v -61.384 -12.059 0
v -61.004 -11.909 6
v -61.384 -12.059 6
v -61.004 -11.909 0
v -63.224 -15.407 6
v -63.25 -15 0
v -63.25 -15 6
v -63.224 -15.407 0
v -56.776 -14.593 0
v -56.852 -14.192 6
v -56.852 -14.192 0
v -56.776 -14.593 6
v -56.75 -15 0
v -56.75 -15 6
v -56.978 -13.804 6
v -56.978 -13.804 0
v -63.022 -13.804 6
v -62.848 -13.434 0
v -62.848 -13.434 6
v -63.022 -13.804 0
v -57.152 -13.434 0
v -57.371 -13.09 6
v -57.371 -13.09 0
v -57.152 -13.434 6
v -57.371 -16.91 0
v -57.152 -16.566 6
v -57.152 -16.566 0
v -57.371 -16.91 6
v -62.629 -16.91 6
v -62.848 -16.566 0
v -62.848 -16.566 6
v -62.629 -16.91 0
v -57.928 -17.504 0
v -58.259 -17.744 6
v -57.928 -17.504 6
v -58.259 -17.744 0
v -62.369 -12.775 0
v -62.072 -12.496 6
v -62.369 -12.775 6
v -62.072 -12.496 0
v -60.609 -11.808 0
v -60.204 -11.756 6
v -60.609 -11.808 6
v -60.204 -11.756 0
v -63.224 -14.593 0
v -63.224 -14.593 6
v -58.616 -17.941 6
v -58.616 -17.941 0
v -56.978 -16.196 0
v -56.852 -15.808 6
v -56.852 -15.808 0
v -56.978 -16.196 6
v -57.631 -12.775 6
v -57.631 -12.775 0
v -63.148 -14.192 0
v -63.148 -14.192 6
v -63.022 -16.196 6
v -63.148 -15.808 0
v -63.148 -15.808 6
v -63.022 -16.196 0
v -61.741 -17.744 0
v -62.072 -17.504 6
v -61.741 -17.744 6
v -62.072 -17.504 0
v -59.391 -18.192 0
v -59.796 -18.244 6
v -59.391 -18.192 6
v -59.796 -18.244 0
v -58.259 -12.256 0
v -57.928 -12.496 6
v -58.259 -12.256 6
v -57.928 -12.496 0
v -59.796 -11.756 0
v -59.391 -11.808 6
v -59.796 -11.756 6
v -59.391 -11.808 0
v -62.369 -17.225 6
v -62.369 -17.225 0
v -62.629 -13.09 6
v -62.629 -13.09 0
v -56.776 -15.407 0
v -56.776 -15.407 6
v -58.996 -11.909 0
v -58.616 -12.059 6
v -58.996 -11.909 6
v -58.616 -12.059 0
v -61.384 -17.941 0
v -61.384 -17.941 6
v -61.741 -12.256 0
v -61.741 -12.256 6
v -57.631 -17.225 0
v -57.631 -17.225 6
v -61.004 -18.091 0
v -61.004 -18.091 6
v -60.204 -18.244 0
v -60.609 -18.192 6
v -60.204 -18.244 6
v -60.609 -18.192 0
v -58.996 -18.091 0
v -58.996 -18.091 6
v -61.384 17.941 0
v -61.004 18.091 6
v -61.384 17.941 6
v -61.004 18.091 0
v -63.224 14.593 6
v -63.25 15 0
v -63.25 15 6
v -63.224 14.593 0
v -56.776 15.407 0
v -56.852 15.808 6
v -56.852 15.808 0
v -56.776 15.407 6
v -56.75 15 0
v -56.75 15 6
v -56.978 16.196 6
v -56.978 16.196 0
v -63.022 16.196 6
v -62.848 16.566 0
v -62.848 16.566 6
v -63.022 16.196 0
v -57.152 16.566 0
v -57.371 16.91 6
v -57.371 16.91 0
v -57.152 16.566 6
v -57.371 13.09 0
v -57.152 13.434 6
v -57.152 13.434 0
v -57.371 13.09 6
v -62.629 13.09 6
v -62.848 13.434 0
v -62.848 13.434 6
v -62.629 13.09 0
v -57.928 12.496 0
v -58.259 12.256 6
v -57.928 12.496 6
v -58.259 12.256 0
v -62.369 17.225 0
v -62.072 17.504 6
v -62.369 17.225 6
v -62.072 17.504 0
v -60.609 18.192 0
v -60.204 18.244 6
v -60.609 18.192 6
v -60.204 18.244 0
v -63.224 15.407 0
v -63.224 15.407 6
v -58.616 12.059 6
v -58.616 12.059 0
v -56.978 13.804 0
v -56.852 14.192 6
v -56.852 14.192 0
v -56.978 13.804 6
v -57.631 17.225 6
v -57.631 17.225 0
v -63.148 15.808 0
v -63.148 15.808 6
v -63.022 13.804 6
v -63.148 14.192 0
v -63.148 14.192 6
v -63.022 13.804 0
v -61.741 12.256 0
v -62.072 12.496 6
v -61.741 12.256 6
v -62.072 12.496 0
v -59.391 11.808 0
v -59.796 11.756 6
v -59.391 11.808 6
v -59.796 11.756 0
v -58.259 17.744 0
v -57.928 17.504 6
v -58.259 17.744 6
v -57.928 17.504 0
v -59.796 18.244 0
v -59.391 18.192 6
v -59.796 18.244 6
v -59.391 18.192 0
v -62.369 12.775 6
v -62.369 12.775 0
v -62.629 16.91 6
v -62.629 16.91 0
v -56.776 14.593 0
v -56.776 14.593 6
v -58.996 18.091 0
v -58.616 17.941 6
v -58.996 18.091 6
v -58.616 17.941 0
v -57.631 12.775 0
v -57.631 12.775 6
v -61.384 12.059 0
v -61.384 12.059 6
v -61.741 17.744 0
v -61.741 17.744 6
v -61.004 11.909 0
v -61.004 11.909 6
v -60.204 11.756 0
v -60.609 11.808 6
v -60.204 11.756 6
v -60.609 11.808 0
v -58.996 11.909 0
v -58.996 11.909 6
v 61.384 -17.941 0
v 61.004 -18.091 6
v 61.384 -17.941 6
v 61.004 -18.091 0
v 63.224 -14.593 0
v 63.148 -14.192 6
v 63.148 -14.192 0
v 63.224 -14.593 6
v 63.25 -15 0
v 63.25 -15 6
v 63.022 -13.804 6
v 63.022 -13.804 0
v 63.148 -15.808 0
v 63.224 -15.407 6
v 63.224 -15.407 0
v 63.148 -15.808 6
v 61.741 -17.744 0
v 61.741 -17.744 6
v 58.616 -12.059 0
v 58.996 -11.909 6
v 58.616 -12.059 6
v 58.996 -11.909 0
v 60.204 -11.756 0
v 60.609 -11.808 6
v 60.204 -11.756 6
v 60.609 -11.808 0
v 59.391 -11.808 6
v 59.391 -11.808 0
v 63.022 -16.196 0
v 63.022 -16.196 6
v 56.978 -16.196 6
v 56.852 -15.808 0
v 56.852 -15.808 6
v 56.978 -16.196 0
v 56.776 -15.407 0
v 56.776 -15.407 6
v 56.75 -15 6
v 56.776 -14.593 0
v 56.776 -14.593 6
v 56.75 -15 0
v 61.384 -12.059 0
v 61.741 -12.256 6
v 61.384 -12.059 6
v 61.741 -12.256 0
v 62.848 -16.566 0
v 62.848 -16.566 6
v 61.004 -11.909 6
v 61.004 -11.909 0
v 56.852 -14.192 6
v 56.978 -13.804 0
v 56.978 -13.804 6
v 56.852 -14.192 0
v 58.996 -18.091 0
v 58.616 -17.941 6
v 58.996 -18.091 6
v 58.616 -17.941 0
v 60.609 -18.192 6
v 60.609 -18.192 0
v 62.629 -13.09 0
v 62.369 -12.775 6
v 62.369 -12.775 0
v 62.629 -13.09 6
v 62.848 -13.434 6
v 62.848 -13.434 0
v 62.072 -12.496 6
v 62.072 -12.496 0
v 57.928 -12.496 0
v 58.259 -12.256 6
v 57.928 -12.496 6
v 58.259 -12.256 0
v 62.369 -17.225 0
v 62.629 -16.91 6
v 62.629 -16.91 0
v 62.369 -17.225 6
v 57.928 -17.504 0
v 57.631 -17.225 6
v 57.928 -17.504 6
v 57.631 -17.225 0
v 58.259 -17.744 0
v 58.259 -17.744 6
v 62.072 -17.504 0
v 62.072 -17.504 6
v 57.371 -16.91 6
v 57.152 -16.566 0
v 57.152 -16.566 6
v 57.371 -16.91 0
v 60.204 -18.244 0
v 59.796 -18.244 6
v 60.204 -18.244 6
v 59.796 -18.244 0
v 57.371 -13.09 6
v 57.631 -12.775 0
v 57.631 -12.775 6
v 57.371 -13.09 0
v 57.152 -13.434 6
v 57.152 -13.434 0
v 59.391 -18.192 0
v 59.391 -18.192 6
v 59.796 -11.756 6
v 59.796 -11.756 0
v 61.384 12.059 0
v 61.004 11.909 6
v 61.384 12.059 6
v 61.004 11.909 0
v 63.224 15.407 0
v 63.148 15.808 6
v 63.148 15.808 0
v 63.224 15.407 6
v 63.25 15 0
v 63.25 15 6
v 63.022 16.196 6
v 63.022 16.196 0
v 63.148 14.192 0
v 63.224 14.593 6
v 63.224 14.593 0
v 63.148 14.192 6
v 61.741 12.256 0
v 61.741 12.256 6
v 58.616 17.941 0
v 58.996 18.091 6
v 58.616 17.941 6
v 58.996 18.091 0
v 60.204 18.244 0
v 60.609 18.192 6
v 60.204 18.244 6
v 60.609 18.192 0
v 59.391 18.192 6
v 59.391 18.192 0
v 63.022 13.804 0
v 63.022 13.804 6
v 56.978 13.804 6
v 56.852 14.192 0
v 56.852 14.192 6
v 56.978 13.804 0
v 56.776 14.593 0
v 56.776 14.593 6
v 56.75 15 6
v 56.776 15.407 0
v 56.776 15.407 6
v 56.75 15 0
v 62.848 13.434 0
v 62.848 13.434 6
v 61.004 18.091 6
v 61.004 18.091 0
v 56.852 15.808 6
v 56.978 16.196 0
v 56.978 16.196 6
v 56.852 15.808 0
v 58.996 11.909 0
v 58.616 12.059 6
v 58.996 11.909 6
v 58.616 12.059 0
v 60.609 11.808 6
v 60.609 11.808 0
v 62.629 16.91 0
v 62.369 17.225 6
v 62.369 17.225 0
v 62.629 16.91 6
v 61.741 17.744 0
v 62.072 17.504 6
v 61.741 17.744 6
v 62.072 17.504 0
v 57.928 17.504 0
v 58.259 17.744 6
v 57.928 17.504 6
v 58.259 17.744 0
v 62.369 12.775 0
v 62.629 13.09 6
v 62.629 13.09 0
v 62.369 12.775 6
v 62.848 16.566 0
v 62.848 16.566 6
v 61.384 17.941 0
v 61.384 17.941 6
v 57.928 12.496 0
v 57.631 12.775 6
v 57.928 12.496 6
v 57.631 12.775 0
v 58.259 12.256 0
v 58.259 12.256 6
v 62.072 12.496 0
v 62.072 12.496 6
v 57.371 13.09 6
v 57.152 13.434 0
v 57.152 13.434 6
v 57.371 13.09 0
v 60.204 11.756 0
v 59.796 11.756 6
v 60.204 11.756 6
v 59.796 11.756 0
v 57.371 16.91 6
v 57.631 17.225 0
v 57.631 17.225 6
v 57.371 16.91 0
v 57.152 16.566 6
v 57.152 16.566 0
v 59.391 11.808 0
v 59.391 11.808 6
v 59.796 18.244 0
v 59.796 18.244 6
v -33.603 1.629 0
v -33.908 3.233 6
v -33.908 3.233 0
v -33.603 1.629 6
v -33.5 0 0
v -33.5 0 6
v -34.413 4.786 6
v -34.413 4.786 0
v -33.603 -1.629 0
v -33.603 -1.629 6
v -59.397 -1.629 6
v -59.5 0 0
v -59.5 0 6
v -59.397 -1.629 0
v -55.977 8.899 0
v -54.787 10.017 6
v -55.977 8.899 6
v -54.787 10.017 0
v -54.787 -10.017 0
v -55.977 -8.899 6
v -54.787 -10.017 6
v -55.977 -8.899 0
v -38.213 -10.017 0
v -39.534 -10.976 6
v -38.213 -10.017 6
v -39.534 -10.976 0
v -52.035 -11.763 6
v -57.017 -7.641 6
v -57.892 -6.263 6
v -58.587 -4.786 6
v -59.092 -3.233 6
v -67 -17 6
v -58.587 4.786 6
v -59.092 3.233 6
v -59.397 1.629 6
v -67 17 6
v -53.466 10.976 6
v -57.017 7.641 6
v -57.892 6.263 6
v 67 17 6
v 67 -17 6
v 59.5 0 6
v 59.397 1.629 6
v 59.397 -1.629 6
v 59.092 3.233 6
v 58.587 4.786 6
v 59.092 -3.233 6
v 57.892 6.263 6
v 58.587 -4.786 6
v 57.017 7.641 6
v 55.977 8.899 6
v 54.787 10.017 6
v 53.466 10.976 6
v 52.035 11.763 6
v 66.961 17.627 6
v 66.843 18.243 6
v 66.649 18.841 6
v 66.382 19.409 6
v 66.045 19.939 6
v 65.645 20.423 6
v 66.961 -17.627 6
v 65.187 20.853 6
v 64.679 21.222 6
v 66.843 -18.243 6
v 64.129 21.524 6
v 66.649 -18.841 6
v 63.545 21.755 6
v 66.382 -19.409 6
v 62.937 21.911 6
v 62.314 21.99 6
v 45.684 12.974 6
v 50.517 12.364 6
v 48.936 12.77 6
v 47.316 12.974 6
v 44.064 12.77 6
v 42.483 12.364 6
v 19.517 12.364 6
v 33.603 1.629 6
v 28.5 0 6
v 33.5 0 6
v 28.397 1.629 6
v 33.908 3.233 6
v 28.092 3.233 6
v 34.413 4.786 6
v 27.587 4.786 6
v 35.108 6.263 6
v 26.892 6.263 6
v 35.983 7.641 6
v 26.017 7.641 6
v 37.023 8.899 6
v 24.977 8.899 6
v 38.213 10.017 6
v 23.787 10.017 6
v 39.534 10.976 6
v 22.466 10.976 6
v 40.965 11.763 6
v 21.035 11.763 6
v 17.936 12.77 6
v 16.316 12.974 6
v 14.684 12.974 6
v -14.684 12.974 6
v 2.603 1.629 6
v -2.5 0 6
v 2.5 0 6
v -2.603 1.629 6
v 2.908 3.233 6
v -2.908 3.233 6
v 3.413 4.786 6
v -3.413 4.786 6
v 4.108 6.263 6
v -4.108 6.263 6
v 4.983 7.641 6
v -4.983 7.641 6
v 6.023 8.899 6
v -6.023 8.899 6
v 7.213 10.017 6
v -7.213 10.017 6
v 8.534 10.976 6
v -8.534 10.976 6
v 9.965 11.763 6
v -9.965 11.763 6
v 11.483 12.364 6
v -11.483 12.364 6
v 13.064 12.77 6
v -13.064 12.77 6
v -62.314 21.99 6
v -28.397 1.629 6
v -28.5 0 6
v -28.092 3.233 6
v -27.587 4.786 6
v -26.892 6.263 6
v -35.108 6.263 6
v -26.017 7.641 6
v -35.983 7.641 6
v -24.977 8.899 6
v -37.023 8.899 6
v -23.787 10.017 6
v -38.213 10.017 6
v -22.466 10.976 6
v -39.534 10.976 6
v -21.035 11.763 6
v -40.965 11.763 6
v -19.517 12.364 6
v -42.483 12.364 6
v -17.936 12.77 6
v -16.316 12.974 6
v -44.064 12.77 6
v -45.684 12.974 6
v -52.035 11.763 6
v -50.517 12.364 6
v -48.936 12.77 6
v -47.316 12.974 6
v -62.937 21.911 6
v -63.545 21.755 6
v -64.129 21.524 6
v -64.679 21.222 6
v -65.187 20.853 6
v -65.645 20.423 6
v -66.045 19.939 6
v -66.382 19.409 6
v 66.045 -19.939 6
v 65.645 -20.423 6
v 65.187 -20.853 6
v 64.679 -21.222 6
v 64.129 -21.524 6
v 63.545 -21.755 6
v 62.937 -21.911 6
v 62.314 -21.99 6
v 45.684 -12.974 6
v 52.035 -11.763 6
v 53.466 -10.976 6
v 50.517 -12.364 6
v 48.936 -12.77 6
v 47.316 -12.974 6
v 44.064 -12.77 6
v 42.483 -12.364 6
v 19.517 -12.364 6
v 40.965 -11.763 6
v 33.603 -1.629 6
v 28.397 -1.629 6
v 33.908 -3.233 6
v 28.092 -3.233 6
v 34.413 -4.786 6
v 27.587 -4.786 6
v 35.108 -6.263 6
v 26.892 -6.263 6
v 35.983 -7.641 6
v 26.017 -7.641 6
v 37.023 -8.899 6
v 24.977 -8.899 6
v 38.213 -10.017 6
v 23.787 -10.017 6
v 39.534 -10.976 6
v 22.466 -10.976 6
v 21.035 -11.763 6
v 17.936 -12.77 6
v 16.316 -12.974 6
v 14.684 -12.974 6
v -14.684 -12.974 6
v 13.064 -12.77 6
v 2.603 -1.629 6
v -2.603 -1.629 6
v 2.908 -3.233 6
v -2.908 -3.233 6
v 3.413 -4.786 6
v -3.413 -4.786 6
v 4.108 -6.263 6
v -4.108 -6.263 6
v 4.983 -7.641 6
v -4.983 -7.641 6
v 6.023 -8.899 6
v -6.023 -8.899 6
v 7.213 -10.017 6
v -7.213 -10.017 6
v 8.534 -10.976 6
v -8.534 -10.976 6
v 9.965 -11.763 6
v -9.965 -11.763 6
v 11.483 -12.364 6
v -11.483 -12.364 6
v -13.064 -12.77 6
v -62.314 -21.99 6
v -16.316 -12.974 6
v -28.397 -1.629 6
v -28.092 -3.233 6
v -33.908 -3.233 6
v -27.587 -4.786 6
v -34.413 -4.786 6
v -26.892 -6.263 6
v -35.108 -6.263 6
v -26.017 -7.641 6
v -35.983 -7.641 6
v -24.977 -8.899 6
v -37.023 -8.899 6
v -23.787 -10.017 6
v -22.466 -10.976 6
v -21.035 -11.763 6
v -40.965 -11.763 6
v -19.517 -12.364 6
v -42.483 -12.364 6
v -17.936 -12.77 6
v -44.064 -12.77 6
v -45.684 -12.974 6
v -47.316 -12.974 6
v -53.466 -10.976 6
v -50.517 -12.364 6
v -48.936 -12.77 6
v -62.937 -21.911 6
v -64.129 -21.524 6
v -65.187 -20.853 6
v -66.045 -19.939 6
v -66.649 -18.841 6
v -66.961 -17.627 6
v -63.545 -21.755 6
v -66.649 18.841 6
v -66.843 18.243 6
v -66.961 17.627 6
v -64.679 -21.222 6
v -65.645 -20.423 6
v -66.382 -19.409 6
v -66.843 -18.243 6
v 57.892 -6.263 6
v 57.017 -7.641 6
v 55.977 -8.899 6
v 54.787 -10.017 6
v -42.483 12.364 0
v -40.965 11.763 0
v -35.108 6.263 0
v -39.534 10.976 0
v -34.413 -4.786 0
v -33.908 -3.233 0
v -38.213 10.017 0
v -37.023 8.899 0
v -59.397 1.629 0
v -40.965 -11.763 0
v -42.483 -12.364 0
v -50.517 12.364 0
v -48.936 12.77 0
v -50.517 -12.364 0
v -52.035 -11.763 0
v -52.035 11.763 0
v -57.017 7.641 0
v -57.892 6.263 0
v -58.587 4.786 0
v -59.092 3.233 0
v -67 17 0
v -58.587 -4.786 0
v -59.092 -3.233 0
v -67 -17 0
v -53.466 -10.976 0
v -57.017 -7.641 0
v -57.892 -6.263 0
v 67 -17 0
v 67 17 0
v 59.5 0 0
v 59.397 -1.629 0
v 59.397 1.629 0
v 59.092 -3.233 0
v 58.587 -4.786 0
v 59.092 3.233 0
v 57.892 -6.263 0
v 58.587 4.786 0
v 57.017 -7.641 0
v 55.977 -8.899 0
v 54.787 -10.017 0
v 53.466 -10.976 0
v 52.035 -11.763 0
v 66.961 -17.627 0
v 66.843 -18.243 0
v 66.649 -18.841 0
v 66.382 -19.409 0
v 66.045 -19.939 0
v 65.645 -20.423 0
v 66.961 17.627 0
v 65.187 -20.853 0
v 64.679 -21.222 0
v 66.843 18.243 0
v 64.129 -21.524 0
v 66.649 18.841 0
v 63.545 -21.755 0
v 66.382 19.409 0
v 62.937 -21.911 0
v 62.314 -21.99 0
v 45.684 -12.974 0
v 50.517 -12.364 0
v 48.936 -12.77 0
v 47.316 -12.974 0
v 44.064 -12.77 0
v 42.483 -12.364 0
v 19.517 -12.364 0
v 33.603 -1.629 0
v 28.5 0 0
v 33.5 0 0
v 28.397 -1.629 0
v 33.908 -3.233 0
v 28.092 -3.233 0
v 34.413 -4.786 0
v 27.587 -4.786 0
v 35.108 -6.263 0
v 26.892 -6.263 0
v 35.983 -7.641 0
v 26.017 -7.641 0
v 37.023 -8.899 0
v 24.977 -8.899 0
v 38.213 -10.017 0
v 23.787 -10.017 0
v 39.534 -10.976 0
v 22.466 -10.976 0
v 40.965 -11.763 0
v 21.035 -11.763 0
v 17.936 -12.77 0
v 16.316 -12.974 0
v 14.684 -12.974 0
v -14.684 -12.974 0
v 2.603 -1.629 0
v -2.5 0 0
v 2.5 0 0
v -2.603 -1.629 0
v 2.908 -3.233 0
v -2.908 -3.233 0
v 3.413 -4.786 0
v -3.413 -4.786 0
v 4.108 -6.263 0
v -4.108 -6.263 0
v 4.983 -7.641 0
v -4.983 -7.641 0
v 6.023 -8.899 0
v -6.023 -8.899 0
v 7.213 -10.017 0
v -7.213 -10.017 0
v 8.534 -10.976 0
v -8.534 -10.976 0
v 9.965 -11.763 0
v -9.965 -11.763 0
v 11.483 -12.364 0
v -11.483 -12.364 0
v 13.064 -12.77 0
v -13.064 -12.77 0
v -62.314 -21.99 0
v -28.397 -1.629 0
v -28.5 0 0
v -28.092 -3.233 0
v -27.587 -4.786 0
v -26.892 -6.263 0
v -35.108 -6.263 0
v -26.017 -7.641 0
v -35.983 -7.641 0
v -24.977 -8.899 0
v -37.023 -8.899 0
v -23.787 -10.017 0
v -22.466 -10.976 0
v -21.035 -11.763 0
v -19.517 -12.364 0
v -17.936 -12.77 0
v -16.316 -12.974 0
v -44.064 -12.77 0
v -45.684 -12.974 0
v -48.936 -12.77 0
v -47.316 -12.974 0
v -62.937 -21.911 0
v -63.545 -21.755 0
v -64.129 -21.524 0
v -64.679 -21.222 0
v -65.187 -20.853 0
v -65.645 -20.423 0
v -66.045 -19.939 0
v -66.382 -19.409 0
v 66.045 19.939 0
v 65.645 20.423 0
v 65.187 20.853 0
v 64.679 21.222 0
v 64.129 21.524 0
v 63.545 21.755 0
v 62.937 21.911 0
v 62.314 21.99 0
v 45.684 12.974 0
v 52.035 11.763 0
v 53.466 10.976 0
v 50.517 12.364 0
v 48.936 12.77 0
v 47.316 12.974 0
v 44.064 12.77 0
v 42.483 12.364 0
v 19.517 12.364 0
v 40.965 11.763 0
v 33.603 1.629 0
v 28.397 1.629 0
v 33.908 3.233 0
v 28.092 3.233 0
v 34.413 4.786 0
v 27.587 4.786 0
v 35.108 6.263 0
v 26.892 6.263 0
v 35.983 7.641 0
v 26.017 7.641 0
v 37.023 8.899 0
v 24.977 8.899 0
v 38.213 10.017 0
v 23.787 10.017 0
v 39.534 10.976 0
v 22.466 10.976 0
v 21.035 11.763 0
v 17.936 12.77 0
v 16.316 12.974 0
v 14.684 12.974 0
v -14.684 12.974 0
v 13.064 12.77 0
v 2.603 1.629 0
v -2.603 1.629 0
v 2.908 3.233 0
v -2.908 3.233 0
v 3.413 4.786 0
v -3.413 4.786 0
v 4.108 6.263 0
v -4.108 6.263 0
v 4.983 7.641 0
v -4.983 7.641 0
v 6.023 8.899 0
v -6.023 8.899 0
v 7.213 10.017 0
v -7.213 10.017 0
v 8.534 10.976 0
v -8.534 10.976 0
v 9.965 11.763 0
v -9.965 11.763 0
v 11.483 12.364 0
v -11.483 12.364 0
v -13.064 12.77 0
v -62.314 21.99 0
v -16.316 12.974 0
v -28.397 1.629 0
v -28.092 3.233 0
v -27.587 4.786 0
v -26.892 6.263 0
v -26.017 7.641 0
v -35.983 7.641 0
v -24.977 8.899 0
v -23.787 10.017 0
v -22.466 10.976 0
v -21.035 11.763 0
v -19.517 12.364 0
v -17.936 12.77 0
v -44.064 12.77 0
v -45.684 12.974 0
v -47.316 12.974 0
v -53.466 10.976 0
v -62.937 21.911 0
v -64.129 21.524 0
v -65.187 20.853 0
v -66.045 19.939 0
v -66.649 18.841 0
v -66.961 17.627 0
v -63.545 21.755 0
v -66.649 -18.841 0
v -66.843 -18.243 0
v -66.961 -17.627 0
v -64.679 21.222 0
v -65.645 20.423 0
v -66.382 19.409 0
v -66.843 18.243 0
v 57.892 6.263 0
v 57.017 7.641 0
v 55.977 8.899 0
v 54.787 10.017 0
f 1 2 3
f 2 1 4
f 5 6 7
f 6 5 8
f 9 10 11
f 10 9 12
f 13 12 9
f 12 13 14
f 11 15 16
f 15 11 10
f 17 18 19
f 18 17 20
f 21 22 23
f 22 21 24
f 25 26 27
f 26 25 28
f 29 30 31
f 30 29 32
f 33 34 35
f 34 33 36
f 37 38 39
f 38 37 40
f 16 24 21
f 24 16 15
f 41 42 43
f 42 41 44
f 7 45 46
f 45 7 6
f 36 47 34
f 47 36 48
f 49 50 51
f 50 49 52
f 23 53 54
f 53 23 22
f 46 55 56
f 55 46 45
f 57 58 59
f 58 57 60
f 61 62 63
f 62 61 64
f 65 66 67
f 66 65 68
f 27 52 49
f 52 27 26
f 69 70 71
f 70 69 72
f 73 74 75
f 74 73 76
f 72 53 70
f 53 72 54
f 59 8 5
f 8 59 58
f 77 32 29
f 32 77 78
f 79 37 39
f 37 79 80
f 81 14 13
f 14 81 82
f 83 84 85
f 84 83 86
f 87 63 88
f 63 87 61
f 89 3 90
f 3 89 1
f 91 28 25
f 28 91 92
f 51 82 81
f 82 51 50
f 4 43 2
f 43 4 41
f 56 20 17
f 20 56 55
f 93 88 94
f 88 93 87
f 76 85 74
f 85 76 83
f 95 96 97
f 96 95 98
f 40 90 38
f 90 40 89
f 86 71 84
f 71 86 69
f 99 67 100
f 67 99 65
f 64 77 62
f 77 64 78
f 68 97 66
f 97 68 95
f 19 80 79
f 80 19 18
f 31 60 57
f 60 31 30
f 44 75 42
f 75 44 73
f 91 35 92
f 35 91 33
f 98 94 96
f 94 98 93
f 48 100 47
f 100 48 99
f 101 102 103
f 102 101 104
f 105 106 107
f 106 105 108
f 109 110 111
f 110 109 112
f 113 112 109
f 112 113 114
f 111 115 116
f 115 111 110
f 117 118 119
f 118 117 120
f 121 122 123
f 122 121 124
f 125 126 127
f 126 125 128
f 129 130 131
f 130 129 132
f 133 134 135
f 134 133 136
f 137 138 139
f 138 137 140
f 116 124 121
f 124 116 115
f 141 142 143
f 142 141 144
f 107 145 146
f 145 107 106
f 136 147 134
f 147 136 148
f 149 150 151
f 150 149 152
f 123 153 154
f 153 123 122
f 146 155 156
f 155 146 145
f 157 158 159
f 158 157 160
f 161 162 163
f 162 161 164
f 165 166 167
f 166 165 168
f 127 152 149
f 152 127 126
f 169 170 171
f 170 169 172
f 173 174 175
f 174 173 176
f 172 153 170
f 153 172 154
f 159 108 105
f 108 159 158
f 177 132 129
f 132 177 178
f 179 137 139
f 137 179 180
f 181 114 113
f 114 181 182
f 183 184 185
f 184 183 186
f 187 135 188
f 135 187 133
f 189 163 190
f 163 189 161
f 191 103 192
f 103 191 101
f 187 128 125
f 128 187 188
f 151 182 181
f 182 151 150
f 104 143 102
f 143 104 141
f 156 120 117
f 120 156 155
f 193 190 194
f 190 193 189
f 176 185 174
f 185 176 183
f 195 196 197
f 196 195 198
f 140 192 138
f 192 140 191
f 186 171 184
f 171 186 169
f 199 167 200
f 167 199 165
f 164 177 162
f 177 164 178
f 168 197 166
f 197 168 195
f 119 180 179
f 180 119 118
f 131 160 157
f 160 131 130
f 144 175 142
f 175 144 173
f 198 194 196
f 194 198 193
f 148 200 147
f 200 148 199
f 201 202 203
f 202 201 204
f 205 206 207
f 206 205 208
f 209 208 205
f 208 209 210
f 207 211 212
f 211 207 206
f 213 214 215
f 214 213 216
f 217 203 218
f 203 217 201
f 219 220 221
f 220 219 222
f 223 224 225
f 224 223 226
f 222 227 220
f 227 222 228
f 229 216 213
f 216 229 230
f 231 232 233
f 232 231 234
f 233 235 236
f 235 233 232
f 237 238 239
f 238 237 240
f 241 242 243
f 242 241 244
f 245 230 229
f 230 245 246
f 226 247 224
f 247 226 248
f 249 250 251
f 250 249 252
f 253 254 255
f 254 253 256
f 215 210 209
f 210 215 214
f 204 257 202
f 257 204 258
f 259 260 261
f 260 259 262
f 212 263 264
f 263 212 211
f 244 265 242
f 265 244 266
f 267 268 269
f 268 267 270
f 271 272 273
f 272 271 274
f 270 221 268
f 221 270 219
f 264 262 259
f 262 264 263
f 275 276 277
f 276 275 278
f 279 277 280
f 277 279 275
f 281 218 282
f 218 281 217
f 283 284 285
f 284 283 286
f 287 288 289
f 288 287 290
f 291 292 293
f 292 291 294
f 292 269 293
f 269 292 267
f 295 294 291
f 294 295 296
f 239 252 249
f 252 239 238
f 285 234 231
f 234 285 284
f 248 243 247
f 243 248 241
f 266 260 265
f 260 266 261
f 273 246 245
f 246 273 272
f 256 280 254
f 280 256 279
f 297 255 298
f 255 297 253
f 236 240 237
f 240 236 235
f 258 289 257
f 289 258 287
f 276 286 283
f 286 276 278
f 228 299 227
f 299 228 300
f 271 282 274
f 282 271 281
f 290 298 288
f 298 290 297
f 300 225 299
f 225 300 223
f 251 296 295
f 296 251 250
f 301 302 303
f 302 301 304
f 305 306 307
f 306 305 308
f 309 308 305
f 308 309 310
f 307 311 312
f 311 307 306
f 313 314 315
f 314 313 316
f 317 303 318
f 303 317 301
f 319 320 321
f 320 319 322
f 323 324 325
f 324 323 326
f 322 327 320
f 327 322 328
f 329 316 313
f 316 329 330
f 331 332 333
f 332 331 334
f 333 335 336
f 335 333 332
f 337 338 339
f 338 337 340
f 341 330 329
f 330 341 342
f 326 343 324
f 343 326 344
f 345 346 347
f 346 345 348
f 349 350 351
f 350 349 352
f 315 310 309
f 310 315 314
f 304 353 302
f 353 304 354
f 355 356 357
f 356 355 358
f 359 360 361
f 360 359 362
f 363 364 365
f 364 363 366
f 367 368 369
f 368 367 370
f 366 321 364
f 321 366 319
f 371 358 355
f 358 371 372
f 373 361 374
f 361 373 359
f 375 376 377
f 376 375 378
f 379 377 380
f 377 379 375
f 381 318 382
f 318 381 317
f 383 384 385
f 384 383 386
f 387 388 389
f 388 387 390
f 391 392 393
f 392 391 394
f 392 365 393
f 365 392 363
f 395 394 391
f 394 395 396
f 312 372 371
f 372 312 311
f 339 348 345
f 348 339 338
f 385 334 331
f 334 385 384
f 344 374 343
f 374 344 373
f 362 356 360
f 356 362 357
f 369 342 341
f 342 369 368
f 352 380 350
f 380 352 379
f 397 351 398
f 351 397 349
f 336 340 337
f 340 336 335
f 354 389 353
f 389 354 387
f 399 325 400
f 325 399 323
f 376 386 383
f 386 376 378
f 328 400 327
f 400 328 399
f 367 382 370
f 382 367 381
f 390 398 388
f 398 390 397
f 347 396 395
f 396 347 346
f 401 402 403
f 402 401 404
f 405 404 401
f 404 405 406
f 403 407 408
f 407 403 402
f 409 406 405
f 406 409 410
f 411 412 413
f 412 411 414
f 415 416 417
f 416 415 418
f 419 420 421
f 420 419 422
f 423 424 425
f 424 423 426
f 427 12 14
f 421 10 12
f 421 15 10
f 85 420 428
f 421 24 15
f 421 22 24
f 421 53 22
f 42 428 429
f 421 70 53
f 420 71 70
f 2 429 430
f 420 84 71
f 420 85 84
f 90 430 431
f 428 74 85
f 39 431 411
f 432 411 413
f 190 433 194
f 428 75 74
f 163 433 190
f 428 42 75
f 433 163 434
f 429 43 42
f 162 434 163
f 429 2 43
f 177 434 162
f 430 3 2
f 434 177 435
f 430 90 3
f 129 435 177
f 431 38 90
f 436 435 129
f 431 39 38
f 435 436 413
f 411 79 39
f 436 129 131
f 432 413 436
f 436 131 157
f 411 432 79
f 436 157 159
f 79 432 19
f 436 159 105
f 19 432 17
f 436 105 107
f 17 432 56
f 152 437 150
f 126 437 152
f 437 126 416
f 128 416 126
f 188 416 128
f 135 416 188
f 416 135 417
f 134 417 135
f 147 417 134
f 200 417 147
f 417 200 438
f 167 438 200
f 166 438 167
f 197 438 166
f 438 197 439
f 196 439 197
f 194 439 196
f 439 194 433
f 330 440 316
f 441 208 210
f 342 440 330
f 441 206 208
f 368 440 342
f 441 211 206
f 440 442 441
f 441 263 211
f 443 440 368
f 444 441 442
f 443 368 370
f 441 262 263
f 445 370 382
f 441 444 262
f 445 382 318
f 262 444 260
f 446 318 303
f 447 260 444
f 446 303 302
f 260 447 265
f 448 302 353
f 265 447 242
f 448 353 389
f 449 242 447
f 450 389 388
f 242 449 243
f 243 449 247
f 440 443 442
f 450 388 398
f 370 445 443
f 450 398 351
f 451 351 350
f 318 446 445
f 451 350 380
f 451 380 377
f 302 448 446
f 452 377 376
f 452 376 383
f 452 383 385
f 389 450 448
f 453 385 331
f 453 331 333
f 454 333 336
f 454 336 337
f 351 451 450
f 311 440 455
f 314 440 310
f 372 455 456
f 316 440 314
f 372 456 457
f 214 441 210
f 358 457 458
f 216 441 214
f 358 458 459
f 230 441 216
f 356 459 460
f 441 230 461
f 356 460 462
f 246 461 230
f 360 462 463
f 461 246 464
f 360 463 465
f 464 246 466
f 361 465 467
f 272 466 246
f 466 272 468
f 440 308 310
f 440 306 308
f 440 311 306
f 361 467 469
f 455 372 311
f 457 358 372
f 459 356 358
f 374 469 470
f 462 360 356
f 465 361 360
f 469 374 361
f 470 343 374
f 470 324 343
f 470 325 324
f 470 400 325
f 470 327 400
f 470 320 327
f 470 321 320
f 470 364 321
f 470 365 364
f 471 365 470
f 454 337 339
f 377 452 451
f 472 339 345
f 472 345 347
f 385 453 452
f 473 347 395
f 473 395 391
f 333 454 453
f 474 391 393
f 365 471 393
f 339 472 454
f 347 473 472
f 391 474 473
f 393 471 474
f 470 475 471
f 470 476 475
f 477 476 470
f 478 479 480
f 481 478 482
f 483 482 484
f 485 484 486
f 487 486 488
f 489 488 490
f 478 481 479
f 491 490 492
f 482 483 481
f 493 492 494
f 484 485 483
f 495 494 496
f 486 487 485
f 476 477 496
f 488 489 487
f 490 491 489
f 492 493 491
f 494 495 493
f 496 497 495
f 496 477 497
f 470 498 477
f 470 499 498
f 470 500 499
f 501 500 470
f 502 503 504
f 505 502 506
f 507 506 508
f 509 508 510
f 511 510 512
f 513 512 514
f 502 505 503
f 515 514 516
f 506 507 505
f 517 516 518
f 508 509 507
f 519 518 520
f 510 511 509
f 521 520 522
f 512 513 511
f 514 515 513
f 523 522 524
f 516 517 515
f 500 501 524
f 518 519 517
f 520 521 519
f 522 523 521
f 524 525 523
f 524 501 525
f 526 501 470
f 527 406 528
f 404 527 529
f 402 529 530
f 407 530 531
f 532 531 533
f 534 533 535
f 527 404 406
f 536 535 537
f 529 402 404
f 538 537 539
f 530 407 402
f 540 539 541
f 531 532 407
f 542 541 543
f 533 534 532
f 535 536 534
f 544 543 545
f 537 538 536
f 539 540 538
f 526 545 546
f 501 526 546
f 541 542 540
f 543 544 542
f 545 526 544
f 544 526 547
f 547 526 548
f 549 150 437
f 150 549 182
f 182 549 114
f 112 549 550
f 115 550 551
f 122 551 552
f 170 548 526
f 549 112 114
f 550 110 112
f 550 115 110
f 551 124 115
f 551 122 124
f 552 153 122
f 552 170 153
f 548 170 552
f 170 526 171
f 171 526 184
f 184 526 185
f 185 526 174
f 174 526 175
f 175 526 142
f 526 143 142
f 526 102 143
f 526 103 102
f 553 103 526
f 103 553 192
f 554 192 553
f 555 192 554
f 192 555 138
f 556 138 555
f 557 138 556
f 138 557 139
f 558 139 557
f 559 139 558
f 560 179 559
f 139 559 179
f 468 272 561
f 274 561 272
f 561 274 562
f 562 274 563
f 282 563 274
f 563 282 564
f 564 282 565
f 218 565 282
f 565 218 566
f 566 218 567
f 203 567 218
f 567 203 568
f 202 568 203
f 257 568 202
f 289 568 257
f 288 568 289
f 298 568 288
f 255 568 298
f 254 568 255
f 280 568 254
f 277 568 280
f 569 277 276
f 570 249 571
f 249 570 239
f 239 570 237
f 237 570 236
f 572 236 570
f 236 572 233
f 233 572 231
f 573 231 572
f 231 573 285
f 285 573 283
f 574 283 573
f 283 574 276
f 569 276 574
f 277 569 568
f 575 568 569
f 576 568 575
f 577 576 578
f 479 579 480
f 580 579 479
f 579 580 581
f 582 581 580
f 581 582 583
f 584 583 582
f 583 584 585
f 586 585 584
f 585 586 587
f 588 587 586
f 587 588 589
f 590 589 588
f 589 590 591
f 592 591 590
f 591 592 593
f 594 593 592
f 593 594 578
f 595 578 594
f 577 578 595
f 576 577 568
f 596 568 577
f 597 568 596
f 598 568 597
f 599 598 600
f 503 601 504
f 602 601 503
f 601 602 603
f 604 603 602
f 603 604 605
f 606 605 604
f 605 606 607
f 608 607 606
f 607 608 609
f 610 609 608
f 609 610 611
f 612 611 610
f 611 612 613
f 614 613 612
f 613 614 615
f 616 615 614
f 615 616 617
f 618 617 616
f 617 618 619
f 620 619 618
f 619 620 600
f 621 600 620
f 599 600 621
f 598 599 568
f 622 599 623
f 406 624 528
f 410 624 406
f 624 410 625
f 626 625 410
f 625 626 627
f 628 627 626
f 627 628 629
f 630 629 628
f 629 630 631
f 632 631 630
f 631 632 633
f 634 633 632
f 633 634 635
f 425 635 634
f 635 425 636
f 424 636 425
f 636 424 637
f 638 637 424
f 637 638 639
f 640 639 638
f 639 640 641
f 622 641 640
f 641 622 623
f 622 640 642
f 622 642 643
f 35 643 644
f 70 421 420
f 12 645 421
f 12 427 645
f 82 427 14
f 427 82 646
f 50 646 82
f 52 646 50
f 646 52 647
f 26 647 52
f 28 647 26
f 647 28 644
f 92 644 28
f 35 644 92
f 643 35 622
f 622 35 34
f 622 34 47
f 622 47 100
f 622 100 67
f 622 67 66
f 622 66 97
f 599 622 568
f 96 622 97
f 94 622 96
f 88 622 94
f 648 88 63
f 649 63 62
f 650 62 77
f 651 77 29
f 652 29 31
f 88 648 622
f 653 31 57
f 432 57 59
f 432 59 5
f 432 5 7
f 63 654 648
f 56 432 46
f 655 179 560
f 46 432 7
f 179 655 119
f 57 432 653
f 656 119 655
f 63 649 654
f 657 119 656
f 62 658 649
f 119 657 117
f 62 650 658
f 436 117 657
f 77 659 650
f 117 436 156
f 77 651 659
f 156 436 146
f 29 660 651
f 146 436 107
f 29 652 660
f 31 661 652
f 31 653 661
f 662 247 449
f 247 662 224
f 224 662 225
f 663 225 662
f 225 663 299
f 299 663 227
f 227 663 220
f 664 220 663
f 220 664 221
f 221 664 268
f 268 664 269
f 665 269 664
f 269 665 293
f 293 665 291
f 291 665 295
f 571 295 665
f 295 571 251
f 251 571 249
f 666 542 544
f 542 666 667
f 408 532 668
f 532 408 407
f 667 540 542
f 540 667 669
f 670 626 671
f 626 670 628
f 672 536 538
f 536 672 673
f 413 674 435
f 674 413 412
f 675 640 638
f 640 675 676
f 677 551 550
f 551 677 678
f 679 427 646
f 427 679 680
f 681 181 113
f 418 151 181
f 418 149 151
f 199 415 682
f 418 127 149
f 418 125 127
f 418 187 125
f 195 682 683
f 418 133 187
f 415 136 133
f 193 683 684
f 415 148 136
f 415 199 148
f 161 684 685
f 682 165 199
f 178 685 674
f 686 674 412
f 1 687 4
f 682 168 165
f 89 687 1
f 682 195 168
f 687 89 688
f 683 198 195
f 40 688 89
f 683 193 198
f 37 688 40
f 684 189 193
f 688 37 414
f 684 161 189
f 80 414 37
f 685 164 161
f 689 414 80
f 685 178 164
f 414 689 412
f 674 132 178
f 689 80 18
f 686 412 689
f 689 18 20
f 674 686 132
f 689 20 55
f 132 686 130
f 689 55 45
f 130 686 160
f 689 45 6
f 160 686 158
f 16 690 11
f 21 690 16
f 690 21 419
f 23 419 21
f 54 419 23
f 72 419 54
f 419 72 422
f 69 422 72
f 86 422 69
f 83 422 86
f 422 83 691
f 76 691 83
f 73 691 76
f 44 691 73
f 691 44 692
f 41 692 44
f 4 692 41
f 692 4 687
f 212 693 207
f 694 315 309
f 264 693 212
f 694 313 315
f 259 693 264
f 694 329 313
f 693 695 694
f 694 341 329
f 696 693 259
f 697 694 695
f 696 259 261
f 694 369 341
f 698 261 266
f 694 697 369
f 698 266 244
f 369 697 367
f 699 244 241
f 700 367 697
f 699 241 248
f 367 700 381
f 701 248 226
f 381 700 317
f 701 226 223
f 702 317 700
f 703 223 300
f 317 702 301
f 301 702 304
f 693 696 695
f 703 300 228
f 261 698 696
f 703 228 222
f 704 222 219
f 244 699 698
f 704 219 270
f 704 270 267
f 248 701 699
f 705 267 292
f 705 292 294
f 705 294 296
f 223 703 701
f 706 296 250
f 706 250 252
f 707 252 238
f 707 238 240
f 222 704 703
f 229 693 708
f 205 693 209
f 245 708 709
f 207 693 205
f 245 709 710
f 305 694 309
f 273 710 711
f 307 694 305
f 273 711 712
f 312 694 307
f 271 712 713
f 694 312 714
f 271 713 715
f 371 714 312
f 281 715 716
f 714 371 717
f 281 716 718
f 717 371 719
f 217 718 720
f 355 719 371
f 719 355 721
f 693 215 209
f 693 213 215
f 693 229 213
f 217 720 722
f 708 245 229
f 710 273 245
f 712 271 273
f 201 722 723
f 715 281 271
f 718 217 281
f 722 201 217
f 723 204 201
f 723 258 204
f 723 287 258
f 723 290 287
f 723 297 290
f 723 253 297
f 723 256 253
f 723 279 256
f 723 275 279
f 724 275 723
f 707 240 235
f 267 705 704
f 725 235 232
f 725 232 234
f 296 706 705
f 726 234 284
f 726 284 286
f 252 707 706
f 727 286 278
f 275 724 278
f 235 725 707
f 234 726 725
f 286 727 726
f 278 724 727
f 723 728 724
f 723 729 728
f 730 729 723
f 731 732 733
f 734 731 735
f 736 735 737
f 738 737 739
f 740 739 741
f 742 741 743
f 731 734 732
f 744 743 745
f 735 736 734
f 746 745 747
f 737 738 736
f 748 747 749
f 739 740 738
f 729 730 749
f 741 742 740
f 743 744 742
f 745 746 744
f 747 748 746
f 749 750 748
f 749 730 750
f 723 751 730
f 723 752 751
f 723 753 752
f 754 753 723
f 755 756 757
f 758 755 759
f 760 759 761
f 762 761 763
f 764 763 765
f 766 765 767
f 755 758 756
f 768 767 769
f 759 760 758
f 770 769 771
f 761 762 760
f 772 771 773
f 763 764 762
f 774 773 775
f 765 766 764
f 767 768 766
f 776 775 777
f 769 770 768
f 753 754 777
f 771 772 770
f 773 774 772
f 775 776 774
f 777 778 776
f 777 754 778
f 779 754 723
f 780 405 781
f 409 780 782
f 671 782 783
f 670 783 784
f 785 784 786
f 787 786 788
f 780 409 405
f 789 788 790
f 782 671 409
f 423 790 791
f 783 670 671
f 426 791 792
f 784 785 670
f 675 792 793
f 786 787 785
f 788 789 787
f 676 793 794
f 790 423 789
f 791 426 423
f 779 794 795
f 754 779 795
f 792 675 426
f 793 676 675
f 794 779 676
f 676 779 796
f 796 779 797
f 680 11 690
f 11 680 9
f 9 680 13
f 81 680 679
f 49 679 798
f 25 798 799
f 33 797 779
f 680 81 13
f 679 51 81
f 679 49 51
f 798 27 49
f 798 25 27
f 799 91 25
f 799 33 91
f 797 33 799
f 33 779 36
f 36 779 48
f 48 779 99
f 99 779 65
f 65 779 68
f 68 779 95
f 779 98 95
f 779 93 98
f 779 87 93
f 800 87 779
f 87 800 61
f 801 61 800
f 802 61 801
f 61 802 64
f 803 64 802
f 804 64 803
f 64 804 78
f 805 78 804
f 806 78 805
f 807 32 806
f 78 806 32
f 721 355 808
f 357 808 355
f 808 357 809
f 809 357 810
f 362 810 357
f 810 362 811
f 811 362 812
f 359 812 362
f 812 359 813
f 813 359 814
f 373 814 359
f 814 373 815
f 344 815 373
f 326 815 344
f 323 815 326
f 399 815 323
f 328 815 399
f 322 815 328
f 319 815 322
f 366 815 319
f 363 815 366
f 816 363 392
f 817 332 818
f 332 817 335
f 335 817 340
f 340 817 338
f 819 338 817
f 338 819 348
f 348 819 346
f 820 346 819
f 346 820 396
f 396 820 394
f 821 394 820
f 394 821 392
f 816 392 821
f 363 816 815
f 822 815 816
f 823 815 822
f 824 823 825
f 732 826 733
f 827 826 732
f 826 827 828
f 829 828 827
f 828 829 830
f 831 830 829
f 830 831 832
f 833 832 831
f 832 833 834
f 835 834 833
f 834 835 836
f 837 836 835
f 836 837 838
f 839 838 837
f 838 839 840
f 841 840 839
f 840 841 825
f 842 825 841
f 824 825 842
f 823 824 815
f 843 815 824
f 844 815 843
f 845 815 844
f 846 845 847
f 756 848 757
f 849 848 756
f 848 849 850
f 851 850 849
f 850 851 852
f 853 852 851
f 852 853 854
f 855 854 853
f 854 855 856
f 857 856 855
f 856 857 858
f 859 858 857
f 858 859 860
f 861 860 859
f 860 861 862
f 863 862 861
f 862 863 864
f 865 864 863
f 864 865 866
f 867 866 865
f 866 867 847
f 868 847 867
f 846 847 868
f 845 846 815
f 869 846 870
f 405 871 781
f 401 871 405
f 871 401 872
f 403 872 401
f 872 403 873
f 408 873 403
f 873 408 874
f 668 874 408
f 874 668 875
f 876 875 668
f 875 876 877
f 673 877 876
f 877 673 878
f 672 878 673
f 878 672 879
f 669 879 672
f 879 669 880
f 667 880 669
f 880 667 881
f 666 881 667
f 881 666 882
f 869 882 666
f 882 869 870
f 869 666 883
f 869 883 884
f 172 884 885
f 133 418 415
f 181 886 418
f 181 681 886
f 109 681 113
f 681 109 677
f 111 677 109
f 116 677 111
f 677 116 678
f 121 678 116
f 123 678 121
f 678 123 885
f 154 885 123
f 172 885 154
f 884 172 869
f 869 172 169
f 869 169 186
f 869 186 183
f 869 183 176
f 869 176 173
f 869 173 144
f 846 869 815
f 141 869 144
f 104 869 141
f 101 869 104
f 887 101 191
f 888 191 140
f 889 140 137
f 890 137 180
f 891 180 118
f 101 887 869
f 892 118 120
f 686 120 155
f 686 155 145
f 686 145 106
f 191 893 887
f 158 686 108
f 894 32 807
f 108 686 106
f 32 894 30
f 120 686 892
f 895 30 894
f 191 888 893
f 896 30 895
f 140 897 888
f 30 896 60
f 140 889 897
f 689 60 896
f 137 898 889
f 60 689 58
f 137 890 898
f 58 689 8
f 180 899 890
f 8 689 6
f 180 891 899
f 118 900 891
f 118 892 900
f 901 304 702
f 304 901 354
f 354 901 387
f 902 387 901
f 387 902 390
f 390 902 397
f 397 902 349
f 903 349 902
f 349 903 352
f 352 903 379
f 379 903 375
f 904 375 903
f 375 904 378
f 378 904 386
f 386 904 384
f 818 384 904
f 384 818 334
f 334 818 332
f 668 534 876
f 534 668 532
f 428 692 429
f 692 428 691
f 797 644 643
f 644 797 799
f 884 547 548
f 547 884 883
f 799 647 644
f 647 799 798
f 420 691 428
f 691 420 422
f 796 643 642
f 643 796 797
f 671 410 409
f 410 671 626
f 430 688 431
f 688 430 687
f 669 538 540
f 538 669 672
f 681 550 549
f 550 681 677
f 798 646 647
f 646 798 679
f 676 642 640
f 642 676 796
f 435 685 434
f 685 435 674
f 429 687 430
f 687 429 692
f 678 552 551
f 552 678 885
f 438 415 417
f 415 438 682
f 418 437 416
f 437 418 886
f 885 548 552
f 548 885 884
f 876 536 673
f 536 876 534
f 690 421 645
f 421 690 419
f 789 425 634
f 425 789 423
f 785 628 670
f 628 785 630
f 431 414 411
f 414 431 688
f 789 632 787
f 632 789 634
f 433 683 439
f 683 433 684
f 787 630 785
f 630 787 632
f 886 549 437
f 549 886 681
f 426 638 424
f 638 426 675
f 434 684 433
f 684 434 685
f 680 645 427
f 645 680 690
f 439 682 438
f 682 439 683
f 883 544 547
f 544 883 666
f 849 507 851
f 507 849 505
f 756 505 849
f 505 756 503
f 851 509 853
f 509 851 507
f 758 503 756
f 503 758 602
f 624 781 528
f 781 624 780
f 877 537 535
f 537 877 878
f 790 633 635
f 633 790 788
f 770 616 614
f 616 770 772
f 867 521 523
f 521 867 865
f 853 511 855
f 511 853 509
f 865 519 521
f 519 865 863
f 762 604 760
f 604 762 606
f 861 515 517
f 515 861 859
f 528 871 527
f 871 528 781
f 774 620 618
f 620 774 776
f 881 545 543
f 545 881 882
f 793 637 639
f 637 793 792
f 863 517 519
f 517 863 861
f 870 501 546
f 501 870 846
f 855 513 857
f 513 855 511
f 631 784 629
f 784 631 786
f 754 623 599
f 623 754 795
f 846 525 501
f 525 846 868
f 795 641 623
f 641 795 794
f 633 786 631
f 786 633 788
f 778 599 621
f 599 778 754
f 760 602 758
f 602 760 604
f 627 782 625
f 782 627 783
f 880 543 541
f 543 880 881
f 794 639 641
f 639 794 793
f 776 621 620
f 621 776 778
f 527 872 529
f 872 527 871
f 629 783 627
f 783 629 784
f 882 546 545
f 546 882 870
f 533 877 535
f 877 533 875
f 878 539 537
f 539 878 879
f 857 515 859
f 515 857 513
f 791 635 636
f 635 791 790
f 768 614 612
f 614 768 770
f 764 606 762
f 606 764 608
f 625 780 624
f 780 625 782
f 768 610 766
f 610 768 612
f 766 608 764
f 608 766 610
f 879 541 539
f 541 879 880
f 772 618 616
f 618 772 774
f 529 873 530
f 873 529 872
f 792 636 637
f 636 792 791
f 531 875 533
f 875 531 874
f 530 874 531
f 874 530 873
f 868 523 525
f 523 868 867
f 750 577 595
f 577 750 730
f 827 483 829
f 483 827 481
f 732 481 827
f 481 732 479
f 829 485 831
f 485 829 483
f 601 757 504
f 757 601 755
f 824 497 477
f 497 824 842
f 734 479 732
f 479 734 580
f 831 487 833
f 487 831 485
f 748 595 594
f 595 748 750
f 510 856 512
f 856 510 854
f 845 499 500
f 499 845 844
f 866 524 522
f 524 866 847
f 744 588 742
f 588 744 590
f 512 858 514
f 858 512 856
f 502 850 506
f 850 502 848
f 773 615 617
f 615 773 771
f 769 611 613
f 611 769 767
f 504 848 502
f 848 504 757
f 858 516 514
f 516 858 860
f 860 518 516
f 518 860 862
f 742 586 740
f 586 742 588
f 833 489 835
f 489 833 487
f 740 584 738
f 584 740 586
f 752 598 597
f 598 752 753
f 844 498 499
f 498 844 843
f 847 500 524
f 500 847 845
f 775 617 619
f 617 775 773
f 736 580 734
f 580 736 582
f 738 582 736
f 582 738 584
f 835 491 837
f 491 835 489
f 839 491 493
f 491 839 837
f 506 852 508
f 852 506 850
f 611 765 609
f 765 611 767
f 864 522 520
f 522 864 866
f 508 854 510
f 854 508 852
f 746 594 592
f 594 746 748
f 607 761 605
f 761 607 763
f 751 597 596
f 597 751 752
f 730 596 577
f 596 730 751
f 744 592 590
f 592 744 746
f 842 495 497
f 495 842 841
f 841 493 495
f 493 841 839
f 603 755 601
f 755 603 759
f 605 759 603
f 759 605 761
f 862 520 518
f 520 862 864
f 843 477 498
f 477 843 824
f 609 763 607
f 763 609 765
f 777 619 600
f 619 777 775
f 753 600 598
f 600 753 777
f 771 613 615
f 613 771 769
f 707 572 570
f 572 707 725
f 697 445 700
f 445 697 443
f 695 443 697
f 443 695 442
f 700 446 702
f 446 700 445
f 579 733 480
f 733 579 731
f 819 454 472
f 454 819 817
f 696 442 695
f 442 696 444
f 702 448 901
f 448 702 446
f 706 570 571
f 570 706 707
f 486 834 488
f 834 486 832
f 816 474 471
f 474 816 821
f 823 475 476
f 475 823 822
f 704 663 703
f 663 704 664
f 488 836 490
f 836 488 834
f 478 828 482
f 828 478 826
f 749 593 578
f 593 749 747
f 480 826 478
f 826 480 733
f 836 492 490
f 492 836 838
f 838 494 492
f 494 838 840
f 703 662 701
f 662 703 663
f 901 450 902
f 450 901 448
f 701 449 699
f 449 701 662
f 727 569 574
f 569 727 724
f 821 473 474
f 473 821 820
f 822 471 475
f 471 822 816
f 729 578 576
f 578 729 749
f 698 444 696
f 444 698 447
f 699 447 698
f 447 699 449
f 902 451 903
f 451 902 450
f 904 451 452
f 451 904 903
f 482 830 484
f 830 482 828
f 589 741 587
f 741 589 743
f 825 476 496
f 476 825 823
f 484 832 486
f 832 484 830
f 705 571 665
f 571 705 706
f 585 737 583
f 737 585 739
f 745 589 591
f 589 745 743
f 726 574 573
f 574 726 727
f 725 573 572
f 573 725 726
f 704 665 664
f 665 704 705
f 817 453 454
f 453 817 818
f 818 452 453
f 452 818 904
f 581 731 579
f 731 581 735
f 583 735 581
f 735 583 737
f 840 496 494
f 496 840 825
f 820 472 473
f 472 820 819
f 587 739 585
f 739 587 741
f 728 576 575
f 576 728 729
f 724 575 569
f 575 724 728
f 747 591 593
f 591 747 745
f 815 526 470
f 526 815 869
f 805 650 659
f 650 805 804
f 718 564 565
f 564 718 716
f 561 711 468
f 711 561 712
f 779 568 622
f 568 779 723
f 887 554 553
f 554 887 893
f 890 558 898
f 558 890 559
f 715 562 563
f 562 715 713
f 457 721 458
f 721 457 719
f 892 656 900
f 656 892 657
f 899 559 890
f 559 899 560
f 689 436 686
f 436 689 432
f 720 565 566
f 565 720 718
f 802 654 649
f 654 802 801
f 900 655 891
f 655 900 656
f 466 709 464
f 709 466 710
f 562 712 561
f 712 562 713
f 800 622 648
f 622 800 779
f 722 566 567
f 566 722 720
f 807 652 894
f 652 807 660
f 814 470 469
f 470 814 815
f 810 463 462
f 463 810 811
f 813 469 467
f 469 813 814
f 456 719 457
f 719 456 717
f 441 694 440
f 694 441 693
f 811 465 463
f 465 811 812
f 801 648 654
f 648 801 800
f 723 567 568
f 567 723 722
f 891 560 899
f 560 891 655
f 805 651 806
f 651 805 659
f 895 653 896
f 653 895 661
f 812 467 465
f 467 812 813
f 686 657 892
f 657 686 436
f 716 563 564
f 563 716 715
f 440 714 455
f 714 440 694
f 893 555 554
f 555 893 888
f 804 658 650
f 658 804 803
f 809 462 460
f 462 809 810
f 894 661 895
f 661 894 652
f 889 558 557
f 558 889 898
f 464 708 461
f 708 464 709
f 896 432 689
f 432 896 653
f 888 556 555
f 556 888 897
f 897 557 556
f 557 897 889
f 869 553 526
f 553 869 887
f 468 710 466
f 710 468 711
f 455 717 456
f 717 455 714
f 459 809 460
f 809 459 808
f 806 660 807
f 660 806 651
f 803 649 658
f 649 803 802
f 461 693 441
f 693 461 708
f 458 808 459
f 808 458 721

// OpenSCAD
$fn = 50;

difference() {
	union() {
		hull() {
			translate(v = [-62.0, 17.0, 0]) {
				cylinder(h = 6, r = 5);
			}
			translate(v = [62.0, 17.0, 0]) {
				cylinder(h = 6, r = 5);
			}
			translate(v = [-62.0, -17.0, 0]) {
				cylinder(h = 6, r = 5);
			}
			translate(v = [62.0, -17.0, 0]) {
				cylinder(h = 6, r = 5);
			}
		}
	}
	union() {
		translate(v = [-60.0, -15.0, -100.0]) {
			cylinder(h = 200, r = 3.25);
		}
		translate(v = [-60.0, 15.0, -100.0]) {
			cylinder(h = 200, r = 3.25);
		}
		translate(v = [60.0, -15.0, -100.0]) {
			cylinder(h = 200, r = 3.25);
		}
		translate(v = [60.0, 15.0, -100.0]) {
			cylinder(h = 200, r = 3.25);
		}
		translate(v = [-60.0, -15.0, -100.0]) {
			cylinder(h = 200, r = 1.8);
		}
		translate(v = [-60.0, 15.0, -100.0]) {
			cylinder(h = 200, r = 1.8);
		}
		translate(v = [60.0, -15.0, -100.0]) {
			cylinder(h = 200, r = 1.8);
		}
		translate(v = [60.0, 15.0, -100.0]) {
			cylinder(h = 200, r = 1.8);
		}
		translate(v = [-46.5, 0, 0.0]) {
			cylinder(h = 6, r = 13.0);
		}
		translate(v = [-15.5, 0, 0.0]) {
			cylinder(h = 6, r = 13.0);
		}
		translate(v = [15.5, 0, 0.0]) {
			cylinder(h = 6, r = 13.0);
		}
		translate(v = [46.5, 0, 0.0]) {
			cylinder(h = 6, r = 13.0);
		}
	}
}
